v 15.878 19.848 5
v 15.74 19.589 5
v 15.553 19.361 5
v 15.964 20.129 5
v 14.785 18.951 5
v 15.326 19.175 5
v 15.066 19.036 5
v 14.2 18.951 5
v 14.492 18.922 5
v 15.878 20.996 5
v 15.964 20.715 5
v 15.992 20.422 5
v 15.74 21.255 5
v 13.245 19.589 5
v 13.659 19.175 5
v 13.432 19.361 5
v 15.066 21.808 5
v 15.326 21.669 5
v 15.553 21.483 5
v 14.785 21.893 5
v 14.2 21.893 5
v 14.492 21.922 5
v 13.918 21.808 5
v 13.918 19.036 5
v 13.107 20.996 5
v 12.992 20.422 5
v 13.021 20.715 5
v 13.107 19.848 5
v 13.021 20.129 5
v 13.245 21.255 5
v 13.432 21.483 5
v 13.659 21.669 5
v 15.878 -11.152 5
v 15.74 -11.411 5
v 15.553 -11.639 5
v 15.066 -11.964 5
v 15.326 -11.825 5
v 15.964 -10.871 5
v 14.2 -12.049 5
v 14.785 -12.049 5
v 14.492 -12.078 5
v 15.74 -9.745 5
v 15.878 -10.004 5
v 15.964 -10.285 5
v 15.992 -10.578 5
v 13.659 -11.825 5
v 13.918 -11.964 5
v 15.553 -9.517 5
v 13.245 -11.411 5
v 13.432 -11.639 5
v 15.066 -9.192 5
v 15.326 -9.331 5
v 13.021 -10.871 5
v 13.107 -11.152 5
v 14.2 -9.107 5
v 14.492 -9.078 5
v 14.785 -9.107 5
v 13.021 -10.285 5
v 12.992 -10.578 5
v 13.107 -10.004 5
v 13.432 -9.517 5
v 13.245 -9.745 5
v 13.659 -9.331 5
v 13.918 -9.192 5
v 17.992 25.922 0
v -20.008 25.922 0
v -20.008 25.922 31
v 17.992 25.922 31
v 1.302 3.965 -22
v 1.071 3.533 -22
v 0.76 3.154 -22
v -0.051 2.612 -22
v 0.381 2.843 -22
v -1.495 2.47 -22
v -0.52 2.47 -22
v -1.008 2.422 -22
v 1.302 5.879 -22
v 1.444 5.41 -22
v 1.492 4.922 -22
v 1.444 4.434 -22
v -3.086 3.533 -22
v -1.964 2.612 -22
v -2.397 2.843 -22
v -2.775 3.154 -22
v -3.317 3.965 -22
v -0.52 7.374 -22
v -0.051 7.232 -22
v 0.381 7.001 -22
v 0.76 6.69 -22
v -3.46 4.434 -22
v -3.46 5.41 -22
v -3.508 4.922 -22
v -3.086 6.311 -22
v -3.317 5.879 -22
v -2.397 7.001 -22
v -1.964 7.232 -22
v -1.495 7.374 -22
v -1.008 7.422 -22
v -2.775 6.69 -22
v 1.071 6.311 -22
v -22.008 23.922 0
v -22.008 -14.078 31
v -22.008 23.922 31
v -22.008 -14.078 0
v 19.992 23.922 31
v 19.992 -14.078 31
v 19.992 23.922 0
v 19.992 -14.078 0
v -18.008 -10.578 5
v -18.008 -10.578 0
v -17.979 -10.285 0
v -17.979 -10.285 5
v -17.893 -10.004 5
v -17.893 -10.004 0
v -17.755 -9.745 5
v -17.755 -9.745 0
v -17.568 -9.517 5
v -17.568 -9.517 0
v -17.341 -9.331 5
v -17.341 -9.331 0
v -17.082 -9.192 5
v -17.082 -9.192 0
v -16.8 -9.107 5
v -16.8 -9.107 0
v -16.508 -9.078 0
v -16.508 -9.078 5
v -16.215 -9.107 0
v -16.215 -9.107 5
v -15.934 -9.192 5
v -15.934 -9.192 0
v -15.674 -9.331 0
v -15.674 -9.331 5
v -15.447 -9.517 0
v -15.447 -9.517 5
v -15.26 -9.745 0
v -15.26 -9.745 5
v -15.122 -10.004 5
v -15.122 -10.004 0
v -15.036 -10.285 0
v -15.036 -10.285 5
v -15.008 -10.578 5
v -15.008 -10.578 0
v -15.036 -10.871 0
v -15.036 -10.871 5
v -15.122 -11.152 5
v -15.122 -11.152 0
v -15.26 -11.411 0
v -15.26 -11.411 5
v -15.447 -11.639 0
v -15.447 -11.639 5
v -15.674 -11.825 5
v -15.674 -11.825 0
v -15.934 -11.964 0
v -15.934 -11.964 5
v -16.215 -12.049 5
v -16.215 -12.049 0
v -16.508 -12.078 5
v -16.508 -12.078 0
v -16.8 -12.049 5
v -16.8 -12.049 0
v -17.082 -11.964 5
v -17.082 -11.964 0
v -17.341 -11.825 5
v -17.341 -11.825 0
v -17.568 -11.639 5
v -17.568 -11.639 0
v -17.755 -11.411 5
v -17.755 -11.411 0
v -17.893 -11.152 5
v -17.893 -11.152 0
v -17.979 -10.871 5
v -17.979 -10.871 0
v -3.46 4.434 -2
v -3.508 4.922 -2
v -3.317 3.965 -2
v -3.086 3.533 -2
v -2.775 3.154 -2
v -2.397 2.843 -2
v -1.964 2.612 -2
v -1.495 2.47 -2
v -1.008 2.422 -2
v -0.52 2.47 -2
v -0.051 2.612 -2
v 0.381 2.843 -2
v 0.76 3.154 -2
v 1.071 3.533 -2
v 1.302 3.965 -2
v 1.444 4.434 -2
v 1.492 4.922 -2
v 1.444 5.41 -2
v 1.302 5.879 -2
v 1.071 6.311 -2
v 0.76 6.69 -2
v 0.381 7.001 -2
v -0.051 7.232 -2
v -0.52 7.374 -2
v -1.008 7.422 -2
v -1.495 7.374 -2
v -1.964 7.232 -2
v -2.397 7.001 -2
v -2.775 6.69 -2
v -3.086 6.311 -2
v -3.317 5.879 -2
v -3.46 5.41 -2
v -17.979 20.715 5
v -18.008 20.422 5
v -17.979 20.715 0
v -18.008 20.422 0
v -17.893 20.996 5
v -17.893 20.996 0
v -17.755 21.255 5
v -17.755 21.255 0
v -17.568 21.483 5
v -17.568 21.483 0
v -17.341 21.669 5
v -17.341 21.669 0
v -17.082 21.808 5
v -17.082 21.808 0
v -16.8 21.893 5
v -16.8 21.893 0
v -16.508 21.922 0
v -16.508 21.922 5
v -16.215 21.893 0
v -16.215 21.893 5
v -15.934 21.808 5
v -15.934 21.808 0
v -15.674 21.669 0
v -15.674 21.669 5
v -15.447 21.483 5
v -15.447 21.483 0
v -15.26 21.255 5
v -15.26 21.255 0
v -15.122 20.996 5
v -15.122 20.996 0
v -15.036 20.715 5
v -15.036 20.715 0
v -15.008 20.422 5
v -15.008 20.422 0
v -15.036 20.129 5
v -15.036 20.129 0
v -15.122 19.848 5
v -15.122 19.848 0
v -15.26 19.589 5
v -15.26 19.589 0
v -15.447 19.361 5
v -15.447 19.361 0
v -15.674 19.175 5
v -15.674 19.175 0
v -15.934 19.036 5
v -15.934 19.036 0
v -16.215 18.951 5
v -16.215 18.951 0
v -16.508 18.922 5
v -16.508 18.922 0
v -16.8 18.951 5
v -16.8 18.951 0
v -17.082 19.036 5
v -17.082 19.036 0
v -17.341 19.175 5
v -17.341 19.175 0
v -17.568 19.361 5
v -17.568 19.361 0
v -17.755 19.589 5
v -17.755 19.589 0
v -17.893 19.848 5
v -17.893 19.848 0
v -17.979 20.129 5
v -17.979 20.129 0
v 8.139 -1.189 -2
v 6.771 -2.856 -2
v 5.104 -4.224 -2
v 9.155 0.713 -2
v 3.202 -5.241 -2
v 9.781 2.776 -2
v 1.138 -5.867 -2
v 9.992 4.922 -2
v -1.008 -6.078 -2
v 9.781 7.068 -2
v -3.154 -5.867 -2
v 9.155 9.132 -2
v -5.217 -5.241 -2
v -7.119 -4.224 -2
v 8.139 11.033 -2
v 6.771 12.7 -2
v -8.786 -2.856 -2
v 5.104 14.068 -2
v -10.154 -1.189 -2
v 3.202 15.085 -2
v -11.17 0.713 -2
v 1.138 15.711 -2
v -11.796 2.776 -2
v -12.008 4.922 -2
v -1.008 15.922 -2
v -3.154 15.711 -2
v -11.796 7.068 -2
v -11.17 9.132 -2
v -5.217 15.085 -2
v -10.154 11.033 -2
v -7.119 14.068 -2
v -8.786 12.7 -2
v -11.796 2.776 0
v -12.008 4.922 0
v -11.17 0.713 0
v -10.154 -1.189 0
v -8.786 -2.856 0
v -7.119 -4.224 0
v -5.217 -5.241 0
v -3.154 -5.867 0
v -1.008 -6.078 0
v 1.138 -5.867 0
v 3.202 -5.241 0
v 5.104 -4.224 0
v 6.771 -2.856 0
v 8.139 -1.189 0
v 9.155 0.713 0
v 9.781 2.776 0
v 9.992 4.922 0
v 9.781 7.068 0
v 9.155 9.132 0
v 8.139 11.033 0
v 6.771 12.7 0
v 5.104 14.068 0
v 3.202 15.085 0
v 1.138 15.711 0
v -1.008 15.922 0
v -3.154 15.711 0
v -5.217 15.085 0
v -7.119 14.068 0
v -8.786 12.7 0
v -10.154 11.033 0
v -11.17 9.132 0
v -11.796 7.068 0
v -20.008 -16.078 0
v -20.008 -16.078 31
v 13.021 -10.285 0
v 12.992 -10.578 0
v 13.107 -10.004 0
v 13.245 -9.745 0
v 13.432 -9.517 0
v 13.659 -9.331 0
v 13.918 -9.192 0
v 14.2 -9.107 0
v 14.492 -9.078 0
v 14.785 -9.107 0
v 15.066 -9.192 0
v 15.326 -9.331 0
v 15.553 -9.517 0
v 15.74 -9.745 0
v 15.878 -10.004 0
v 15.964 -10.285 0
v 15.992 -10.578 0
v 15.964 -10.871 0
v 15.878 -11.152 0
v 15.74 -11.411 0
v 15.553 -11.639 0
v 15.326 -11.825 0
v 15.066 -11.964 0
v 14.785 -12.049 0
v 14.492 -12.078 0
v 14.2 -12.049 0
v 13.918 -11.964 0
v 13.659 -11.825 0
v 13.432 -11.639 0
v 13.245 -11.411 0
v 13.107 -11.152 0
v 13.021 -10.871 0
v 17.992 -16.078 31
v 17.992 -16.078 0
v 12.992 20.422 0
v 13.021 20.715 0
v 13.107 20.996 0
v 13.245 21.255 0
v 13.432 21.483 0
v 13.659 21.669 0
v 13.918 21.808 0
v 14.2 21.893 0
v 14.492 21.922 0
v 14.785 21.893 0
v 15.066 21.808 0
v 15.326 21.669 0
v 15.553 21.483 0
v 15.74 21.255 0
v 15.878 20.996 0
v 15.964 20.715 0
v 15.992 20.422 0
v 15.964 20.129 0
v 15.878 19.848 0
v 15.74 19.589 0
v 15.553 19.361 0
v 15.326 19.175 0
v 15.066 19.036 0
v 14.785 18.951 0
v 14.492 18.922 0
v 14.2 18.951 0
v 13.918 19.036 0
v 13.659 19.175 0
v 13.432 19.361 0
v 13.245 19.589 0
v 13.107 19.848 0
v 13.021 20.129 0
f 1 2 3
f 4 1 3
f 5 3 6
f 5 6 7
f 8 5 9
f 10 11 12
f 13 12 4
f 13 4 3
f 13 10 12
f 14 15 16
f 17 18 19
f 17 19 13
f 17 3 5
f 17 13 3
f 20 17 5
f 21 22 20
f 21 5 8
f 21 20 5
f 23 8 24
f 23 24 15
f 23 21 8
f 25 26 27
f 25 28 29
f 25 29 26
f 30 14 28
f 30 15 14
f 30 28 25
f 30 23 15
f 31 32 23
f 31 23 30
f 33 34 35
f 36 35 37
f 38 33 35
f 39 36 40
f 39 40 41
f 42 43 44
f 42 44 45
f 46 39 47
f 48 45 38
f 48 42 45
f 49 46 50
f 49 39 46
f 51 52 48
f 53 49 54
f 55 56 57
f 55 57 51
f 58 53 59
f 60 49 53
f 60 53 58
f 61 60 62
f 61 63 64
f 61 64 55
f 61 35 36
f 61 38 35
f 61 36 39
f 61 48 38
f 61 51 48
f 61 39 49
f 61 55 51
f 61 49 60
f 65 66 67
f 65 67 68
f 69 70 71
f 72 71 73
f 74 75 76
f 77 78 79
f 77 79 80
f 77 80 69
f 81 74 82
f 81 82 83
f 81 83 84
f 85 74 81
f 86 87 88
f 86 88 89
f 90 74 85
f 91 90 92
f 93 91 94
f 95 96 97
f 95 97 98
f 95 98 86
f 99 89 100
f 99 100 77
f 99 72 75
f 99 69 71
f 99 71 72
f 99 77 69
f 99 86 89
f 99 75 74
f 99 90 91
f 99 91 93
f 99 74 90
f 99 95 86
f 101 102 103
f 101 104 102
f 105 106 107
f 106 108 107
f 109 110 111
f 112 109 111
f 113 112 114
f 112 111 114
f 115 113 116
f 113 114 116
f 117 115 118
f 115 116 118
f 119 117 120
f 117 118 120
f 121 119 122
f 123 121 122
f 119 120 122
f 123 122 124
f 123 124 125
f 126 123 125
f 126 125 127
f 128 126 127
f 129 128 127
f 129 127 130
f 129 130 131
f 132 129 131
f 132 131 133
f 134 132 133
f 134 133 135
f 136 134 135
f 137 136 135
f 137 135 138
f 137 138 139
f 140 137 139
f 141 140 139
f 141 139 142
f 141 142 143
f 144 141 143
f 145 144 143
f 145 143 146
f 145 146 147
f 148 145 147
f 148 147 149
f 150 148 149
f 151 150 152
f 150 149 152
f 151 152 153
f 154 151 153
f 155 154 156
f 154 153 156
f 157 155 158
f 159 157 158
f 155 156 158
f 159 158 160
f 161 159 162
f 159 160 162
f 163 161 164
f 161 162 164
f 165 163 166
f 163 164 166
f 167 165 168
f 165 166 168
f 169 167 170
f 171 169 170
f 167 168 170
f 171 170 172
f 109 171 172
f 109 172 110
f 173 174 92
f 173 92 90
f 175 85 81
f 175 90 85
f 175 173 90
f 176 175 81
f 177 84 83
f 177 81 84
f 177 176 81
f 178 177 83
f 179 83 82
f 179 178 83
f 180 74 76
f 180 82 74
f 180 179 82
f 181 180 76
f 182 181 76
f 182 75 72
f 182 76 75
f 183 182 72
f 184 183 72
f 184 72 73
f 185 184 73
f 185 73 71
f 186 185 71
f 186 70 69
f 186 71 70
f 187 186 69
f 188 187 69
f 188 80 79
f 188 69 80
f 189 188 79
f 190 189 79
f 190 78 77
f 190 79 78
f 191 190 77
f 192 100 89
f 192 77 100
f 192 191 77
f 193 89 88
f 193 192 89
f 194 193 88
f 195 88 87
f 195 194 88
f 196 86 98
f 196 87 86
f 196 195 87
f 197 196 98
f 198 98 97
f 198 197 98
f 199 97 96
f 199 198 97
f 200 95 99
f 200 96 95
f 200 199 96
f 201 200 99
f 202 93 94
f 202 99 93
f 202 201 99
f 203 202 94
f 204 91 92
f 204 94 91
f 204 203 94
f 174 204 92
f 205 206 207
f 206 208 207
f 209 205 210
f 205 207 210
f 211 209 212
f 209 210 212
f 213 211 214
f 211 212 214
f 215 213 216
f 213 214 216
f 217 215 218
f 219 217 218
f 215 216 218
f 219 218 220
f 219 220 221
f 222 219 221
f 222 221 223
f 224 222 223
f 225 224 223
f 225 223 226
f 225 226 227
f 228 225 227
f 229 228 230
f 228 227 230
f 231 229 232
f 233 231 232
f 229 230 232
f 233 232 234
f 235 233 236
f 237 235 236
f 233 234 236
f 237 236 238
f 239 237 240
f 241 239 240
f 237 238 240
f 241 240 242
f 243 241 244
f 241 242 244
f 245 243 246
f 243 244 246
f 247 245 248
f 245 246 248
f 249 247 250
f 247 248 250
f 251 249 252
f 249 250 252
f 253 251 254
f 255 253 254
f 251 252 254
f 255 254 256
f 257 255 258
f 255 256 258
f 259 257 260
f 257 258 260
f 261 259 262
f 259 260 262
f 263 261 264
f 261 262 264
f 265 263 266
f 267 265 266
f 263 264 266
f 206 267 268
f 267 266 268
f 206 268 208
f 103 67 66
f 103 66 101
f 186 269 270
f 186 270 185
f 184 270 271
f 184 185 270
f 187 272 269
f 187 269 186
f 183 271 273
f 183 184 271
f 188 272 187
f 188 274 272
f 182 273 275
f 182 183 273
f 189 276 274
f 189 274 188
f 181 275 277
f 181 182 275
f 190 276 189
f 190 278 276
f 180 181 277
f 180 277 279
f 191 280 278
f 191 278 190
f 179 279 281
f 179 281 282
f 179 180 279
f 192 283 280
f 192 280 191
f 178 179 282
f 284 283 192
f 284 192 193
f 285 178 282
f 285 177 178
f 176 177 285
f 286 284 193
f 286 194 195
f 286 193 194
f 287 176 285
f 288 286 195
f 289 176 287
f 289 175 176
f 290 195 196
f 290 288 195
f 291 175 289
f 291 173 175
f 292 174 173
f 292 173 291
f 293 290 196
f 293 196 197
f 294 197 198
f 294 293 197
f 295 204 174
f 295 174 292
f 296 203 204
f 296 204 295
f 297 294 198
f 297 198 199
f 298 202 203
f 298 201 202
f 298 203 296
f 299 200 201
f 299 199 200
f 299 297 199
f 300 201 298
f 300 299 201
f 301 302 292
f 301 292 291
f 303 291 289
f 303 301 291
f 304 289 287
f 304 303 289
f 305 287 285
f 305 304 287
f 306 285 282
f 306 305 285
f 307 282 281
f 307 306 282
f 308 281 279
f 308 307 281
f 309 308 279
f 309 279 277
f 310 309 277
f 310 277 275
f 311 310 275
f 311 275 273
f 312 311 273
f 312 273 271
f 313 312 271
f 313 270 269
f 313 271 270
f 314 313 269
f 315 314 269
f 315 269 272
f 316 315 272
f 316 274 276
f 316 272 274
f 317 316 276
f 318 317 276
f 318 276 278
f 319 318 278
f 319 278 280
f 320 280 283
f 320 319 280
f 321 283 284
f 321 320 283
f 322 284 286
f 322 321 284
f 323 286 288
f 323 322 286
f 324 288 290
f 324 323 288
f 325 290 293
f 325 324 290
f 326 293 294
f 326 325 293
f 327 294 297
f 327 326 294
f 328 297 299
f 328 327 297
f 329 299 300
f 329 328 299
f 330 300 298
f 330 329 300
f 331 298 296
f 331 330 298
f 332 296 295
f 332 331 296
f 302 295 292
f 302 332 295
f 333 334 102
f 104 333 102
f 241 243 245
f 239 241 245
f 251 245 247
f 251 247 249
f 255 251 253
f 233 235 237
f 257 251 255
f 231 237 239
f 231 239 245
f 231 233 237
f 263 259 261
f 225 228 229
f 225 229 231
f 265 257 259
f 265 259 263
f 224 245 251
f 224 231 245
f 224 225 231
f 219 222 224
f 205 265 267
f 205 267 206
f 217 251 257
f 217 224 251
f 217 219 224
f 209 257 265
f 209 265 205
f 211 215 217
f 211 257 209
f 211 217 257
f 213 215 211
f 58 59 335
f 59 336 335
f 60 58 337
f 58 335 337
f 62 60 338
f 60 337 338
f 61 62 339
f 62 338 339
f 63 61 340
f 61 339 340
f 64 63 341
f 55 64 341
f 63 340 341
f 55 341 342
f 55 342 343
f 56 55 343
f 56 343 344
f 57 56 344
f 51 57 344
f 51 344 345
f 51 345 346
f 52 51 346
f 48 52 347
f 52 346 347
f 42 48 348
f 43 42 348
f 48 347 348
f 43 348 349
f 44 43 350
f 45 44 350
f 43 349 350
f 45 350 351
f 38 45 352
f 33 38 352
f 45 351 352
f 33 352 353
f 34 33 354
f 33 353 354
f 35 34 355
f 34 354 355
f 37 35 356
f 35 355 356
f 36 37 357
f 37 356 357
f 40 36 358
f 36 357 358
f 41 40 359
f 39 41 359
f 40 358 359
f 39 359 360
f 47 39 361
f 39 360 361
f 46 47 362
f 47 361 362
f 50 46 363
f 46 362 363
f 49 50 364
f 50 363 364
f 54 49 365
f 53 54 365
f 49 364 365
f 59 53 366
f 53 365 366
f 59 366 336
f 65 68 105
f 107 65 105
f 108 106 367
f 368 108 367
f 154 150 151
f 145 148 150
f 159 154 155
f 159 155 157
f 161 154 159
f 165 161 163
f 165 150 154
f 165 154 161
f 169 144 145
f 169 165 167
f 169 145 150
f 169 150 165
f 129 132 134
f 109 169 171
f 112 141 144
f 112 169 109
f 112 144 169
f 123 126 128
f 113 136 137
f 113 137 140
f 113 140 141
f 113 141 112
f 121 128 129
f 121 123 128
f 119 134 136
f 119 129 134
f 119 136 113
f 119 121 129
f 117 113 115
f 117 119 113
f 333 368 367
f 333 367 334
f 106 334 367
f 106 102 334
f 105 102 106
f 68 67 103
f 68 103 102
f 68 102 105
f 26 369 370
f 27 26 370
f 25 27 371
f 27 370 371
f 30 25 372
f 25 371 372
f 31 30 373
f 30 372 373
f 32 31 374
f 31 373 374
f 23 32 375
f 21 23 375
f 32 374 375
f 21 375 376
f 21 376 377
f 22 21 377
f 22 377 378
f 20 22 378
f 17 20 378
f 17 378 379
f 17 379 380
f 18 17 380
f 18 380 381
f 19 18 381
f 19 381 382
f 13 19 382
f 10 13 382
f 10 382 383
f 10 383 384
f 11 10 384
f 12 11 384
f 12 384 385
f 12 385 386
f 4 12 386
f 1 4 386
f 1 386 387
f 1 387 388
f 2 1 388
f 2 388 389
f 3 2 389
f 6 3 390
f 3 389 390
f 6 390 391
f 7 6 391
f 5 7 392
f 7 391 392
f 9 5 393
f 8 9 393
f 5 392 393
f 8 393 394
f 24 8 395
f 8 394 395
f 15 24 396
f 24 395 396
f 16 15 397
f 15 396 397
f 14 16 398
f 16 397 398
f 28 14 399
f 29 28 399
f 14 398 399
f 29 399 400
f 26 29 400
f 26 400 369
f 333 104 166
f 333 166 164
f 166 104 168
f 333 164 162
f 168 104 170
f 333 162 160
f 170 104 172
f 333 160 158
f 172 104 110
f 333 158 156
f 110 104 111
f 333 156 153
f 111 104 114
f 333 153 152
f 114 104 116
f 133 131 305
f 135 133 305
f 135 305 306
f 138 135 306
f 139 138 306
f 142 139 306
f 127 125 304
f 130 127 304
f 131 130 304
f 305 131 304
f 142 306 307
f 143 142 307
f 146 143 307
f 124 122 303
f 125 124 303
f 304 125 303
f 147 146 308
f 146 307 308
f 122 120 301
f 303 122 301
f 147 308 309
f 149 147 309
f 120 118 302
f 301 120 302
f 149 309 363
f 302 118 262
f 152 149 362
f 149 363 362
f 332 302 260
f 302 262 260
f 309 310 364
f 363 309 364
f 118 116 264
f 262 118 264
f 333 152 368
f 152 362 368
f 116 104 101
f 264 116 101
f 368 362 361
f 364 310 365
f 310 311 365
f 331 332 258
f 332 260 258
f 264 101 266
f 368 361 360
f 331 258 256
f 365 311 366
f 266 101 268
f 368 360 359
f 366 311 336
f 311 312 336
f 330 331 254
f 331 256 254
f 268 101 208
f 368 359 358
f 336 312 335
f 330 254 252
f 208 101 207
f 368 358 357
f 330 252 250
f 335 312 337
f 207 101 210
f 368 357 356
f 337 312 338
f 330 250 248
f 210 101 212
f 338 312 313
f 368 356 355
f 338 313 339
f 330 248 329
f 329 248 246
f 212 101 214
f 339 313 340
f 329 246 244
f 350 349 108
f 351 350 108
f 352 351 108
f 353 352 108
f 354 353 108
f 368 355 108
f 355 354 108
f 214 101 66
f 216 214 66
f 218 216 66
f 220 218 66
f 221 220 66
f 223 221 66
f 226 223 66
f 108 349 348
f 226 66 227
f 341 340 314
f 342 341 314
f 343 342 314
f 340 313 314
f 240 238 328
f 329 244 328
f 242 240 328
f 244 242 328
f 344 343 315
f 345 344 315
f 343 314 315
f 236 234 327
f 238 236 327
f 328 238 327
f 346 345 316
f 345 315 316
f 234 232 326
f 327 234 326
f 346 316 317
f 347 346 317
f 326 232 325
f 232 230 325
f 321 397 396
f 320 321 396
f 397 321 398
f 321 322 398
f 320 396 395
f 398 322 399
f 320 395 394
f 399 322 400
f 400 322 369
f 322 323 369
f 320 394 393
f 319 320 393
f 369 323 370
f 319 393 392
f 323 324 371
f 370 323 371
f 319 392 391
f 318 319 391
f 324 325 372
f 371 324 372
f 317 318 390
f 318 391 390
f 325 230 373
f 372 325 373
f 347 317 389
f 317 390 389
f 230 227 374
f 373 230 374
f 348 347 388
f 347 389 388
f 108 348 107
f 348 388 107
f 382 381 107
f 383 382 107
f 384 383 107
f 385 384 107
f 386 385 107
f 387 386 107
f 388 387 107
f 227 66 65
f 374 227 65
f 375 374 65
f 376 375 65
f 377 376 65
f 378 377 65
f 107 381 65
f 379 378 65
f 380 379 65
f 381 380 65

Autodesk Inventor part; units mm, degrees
ref_plane "YZ Plane" through (0, 0, 0) normal (1, 0, 0) x (0, 1, 0)
ref_plane "XZ Plane" through (0, 0, 0) normal (0, 1, 0) x (-1, 0, 0)
ref_plane "XY Plane" through (0, 0, 0) normal (0, 0, 1) x (1, 0, 0)
sketch "Sketch1" plane through (0, 0, 0) normal (0, 0, 1) x (1, 0, 0)
  line L0 (19.9924, -21.8579) -> (16.7724, -25.0779) projected
  line L1 (19.9924, -21.8579) -> (19.9924, 20.4221) projected
  arc A0 (19.9924, 20.4221) -> (14.4924, 25.9221) centre (14.4924, 20.4221) ccw construction
  line L2 (14.4924, 25.9221) -> (14.2174, 25.9221) projected
  line L3 (14.2174, 25.9221) -> (14.2174, 26.4221) projected
  line L4 (9.7174, 30.9221) -> (14.2174, 26.4221) projected
  line L5 (-3.2826, 30.9221) -> (3.2174, 30.9221) projected
  line L6 (-7.7826, 26.4221) -> (-3.2826, 30.9221) projected
  line L7 (-7.7826, 25.9221) -> (-7.7826, 26.4221) projected
  line L8 (-7.7826, 25.9221) -> (-16.5076, 25.9221) projected
  arc A1 (-16.5076, 25.9221) -> (-22.0076, 20.4221) centre (-16.5076, 20.4221) ccw construction
  line L9 (-22.0076, 20.4221) -> (-22.0076, -10.5779) projected
  arc A2 (-22.0076, -10.5779) -> (-16.5076, -16.0779) centre (-16.5076, -10.5779) ccw construction
  line L10 (-16.5076, -16.0779) -> (-13.0076, -16.0779) projected
  line L11 (-13.0076, -16.0779) -> (-13.0076, -21.8579) projected
  line L12 (-9.7876, -25.0779) -> (-13.0076, -21.8579) projected
  line L13 (-9.7876, -25.0779) -> (-9.7826, -25.0779) projected
  line L14 (-12.7826, -28.0779) -> (-9.7826, -25.0779) projected
  line L15 (-15.5326, -28.0779) -> (-12.7826, -28.0779) projected
  line L16 (-15.5326, -28.0779) -> (-15.5326, -66.0779) projected
  arc A3 (-15.5326, -66.0779) -> (-9.5326, -72.0779) centre (-9.5326, -66.0779) ccw projected
  line L17 (-9.5326, -72.0779) -> (15.9674, -72.0779) projected
  arc A4 (15.9674, -72.0779) -> (21.9674, -66.0779) centre (15.9674, -66.0779) ccw projected
  line L18 (21.9674, -28.0779) -> (21.9674, -66.0779) projected
  line L19 (19.2174, -28.0779) -> (21.9674, -28.0779) projected
  line L20 (19.2174, -28.0779) -> (16.2174, -25.0779) projected
  line L21 (16.2174, -25.0779) -> (16.7724, -25.0779) projected
  circle A5 centre (-16.5076, 20.4221) radius 1.7 construction
  circle A6 centre (14.4924, 20.4221) radius 1.7 construction
  circle A7 centre (14.4924, -10.5779) radius 1.7 construction
  circle A8 centre (-16.5076, -10.5779) radius 1.7 construction
  circle A9 centre (14.7174, -41.5779) radius 2.25 projected
  circle A10 centre (-8.2826, -41.5779) radius 2.25 projected
  circle A11 centre (14.7174, -64.5779) radius 2.25 projected
  circle A12 centre (-8.2826, -64.5779) radius 2.25 projected
  circle A13 centre (-1.0076, 4.9221) radius 12.5 construction
  line L22 (-20.0076, 25.9221) -> (17.9924, 25.9221)
  line L23 (19.9924, 23.9221) -> (19.9924, -14.0779)
  line L24 (17.9924, -16.0779) -> (-20.0076, -16.0779)
  line L25 (-22.0076, -14.0779) -> (-22.0076, 23.9221)
  line L26 (-22.0076, 25.9221) -> (19.9924, -16.0779) construction
  line L27 (19.9924, 25.9221) -> (-22.0076, -16.0779) construction
  line L28 (-20.0076, 25.9221) -> (-22.0076, 23.9221)
  line L29 (17.9924, 25.9221) -> (19.9924, 23.9221)
  line L30 (19.9924, -14.0779) -> (17.9924, -16.0779)
  line L31 (-20.0076, -16.0779) -> (-22.0076, -14.0779)
  line L32 (7.7174, 40.9221) -> (8.8956, 39.0987) projected
  line L33 (5.2174, 40.9221) -> (7.7174, 40.9221) projected
  line L34 (3.2174, 38.9221) -> (5.2174, 40.9221) projected
  line L35 (3.2174, 30.9221) -> (3.2174, 38.9221) projected
  arc A14 (8.8956, 39.0987) -> (9.7174, 30.9221) centre (18.3776, 35.9221) ccw projected
  point P0 (0, 0)
  dimension "d0" = 2
  dimension "d1" = 2
  dimension "d2" = 2
  dimension "d3" = 2
  dimension "d4" = 2
  dimension "d5" = 2
  dimension "d6" = 2
  dimension "d7" = 2
extrude "Extrusion1" add sketch "Sketch1" along normal blind 31 contours L30 L24 L10 L31 L25 L9 L28 L22 L8 L2 L29 L23 L1
sketch "Sketch2" plane through (0, 0, 0) normal (0, 0, -1) x (-1, 0, 0)
  circle A0 centre (1.0076, 4.9221) radius 12.5 projected
  circle A1 centre (1.0076, 4.9221) radius 11
  point P0 (0, 0)
  dimension "d10" = 22
extrude "Extrusion2" add sketch "Sketch2" along normal blind 2 contours A1
sketch "Sketch3" plane through (0, 0, 0) normal (0, 0, -1) x (-1, 0, 0)
  line L0 (20.0076, 25.9221) -> (22.0076, 23.9221) projected
  line L1 (-19.9924, 23.9221) -> (-17.9924, 25.9221) projected
  line L2 (-17.9924, -16.0779) -> (-19.9924, -14.0779) projected
  line L3 (22.0076, -14.0779) -> (20.0076, -16.0779) projected
  circle A0 centre (-14.4924, 20.4221) radius 1.5
  circle A1 centre (16.5076, 20.4221) radius 1.5
  line L4 (-18.9924, 24.9221) -> (21.0076, -15.0779) construction
  line L5 (21.0076, 24.9221) -> (-18.9924, -15.0779) construction
  circle A2 centre (-14.4924, -10.5779) radius 1.5
  circle A3 centre (16.5076, -10.5779) radius 1.5
  point P0 (0, 0)
  dimension "d13" = 31
  dimension "d14" = 3
extrude "Extrusion3" cut sketch "Sketch3" against normal blind 5
sketch "Sketch4" plane through (-1.0076, 4.9221, -2) normal (0, 0, -1) x (-1, 0, 0)
  circle A0 centre (0, 0) radius 11 projected
  circle A1 centre (0, 0) radius 2.5
  point P0 (-1.0076, -4.9221)
  dimension "d17" = 5
extrude "Extrusion4" add sketch "Sketch4" along normal blind 20 contours A1
equation "\"d1\" = d0"
equation "\"d2\" = d0"
equation "\"d3\" = d2"
equation "\"d4\" = d0"
equation "\"d5\" = d4"
equation "\"d6\" = d0"
equation "\"d7\" = d6"
properties part number "NEMA17"
